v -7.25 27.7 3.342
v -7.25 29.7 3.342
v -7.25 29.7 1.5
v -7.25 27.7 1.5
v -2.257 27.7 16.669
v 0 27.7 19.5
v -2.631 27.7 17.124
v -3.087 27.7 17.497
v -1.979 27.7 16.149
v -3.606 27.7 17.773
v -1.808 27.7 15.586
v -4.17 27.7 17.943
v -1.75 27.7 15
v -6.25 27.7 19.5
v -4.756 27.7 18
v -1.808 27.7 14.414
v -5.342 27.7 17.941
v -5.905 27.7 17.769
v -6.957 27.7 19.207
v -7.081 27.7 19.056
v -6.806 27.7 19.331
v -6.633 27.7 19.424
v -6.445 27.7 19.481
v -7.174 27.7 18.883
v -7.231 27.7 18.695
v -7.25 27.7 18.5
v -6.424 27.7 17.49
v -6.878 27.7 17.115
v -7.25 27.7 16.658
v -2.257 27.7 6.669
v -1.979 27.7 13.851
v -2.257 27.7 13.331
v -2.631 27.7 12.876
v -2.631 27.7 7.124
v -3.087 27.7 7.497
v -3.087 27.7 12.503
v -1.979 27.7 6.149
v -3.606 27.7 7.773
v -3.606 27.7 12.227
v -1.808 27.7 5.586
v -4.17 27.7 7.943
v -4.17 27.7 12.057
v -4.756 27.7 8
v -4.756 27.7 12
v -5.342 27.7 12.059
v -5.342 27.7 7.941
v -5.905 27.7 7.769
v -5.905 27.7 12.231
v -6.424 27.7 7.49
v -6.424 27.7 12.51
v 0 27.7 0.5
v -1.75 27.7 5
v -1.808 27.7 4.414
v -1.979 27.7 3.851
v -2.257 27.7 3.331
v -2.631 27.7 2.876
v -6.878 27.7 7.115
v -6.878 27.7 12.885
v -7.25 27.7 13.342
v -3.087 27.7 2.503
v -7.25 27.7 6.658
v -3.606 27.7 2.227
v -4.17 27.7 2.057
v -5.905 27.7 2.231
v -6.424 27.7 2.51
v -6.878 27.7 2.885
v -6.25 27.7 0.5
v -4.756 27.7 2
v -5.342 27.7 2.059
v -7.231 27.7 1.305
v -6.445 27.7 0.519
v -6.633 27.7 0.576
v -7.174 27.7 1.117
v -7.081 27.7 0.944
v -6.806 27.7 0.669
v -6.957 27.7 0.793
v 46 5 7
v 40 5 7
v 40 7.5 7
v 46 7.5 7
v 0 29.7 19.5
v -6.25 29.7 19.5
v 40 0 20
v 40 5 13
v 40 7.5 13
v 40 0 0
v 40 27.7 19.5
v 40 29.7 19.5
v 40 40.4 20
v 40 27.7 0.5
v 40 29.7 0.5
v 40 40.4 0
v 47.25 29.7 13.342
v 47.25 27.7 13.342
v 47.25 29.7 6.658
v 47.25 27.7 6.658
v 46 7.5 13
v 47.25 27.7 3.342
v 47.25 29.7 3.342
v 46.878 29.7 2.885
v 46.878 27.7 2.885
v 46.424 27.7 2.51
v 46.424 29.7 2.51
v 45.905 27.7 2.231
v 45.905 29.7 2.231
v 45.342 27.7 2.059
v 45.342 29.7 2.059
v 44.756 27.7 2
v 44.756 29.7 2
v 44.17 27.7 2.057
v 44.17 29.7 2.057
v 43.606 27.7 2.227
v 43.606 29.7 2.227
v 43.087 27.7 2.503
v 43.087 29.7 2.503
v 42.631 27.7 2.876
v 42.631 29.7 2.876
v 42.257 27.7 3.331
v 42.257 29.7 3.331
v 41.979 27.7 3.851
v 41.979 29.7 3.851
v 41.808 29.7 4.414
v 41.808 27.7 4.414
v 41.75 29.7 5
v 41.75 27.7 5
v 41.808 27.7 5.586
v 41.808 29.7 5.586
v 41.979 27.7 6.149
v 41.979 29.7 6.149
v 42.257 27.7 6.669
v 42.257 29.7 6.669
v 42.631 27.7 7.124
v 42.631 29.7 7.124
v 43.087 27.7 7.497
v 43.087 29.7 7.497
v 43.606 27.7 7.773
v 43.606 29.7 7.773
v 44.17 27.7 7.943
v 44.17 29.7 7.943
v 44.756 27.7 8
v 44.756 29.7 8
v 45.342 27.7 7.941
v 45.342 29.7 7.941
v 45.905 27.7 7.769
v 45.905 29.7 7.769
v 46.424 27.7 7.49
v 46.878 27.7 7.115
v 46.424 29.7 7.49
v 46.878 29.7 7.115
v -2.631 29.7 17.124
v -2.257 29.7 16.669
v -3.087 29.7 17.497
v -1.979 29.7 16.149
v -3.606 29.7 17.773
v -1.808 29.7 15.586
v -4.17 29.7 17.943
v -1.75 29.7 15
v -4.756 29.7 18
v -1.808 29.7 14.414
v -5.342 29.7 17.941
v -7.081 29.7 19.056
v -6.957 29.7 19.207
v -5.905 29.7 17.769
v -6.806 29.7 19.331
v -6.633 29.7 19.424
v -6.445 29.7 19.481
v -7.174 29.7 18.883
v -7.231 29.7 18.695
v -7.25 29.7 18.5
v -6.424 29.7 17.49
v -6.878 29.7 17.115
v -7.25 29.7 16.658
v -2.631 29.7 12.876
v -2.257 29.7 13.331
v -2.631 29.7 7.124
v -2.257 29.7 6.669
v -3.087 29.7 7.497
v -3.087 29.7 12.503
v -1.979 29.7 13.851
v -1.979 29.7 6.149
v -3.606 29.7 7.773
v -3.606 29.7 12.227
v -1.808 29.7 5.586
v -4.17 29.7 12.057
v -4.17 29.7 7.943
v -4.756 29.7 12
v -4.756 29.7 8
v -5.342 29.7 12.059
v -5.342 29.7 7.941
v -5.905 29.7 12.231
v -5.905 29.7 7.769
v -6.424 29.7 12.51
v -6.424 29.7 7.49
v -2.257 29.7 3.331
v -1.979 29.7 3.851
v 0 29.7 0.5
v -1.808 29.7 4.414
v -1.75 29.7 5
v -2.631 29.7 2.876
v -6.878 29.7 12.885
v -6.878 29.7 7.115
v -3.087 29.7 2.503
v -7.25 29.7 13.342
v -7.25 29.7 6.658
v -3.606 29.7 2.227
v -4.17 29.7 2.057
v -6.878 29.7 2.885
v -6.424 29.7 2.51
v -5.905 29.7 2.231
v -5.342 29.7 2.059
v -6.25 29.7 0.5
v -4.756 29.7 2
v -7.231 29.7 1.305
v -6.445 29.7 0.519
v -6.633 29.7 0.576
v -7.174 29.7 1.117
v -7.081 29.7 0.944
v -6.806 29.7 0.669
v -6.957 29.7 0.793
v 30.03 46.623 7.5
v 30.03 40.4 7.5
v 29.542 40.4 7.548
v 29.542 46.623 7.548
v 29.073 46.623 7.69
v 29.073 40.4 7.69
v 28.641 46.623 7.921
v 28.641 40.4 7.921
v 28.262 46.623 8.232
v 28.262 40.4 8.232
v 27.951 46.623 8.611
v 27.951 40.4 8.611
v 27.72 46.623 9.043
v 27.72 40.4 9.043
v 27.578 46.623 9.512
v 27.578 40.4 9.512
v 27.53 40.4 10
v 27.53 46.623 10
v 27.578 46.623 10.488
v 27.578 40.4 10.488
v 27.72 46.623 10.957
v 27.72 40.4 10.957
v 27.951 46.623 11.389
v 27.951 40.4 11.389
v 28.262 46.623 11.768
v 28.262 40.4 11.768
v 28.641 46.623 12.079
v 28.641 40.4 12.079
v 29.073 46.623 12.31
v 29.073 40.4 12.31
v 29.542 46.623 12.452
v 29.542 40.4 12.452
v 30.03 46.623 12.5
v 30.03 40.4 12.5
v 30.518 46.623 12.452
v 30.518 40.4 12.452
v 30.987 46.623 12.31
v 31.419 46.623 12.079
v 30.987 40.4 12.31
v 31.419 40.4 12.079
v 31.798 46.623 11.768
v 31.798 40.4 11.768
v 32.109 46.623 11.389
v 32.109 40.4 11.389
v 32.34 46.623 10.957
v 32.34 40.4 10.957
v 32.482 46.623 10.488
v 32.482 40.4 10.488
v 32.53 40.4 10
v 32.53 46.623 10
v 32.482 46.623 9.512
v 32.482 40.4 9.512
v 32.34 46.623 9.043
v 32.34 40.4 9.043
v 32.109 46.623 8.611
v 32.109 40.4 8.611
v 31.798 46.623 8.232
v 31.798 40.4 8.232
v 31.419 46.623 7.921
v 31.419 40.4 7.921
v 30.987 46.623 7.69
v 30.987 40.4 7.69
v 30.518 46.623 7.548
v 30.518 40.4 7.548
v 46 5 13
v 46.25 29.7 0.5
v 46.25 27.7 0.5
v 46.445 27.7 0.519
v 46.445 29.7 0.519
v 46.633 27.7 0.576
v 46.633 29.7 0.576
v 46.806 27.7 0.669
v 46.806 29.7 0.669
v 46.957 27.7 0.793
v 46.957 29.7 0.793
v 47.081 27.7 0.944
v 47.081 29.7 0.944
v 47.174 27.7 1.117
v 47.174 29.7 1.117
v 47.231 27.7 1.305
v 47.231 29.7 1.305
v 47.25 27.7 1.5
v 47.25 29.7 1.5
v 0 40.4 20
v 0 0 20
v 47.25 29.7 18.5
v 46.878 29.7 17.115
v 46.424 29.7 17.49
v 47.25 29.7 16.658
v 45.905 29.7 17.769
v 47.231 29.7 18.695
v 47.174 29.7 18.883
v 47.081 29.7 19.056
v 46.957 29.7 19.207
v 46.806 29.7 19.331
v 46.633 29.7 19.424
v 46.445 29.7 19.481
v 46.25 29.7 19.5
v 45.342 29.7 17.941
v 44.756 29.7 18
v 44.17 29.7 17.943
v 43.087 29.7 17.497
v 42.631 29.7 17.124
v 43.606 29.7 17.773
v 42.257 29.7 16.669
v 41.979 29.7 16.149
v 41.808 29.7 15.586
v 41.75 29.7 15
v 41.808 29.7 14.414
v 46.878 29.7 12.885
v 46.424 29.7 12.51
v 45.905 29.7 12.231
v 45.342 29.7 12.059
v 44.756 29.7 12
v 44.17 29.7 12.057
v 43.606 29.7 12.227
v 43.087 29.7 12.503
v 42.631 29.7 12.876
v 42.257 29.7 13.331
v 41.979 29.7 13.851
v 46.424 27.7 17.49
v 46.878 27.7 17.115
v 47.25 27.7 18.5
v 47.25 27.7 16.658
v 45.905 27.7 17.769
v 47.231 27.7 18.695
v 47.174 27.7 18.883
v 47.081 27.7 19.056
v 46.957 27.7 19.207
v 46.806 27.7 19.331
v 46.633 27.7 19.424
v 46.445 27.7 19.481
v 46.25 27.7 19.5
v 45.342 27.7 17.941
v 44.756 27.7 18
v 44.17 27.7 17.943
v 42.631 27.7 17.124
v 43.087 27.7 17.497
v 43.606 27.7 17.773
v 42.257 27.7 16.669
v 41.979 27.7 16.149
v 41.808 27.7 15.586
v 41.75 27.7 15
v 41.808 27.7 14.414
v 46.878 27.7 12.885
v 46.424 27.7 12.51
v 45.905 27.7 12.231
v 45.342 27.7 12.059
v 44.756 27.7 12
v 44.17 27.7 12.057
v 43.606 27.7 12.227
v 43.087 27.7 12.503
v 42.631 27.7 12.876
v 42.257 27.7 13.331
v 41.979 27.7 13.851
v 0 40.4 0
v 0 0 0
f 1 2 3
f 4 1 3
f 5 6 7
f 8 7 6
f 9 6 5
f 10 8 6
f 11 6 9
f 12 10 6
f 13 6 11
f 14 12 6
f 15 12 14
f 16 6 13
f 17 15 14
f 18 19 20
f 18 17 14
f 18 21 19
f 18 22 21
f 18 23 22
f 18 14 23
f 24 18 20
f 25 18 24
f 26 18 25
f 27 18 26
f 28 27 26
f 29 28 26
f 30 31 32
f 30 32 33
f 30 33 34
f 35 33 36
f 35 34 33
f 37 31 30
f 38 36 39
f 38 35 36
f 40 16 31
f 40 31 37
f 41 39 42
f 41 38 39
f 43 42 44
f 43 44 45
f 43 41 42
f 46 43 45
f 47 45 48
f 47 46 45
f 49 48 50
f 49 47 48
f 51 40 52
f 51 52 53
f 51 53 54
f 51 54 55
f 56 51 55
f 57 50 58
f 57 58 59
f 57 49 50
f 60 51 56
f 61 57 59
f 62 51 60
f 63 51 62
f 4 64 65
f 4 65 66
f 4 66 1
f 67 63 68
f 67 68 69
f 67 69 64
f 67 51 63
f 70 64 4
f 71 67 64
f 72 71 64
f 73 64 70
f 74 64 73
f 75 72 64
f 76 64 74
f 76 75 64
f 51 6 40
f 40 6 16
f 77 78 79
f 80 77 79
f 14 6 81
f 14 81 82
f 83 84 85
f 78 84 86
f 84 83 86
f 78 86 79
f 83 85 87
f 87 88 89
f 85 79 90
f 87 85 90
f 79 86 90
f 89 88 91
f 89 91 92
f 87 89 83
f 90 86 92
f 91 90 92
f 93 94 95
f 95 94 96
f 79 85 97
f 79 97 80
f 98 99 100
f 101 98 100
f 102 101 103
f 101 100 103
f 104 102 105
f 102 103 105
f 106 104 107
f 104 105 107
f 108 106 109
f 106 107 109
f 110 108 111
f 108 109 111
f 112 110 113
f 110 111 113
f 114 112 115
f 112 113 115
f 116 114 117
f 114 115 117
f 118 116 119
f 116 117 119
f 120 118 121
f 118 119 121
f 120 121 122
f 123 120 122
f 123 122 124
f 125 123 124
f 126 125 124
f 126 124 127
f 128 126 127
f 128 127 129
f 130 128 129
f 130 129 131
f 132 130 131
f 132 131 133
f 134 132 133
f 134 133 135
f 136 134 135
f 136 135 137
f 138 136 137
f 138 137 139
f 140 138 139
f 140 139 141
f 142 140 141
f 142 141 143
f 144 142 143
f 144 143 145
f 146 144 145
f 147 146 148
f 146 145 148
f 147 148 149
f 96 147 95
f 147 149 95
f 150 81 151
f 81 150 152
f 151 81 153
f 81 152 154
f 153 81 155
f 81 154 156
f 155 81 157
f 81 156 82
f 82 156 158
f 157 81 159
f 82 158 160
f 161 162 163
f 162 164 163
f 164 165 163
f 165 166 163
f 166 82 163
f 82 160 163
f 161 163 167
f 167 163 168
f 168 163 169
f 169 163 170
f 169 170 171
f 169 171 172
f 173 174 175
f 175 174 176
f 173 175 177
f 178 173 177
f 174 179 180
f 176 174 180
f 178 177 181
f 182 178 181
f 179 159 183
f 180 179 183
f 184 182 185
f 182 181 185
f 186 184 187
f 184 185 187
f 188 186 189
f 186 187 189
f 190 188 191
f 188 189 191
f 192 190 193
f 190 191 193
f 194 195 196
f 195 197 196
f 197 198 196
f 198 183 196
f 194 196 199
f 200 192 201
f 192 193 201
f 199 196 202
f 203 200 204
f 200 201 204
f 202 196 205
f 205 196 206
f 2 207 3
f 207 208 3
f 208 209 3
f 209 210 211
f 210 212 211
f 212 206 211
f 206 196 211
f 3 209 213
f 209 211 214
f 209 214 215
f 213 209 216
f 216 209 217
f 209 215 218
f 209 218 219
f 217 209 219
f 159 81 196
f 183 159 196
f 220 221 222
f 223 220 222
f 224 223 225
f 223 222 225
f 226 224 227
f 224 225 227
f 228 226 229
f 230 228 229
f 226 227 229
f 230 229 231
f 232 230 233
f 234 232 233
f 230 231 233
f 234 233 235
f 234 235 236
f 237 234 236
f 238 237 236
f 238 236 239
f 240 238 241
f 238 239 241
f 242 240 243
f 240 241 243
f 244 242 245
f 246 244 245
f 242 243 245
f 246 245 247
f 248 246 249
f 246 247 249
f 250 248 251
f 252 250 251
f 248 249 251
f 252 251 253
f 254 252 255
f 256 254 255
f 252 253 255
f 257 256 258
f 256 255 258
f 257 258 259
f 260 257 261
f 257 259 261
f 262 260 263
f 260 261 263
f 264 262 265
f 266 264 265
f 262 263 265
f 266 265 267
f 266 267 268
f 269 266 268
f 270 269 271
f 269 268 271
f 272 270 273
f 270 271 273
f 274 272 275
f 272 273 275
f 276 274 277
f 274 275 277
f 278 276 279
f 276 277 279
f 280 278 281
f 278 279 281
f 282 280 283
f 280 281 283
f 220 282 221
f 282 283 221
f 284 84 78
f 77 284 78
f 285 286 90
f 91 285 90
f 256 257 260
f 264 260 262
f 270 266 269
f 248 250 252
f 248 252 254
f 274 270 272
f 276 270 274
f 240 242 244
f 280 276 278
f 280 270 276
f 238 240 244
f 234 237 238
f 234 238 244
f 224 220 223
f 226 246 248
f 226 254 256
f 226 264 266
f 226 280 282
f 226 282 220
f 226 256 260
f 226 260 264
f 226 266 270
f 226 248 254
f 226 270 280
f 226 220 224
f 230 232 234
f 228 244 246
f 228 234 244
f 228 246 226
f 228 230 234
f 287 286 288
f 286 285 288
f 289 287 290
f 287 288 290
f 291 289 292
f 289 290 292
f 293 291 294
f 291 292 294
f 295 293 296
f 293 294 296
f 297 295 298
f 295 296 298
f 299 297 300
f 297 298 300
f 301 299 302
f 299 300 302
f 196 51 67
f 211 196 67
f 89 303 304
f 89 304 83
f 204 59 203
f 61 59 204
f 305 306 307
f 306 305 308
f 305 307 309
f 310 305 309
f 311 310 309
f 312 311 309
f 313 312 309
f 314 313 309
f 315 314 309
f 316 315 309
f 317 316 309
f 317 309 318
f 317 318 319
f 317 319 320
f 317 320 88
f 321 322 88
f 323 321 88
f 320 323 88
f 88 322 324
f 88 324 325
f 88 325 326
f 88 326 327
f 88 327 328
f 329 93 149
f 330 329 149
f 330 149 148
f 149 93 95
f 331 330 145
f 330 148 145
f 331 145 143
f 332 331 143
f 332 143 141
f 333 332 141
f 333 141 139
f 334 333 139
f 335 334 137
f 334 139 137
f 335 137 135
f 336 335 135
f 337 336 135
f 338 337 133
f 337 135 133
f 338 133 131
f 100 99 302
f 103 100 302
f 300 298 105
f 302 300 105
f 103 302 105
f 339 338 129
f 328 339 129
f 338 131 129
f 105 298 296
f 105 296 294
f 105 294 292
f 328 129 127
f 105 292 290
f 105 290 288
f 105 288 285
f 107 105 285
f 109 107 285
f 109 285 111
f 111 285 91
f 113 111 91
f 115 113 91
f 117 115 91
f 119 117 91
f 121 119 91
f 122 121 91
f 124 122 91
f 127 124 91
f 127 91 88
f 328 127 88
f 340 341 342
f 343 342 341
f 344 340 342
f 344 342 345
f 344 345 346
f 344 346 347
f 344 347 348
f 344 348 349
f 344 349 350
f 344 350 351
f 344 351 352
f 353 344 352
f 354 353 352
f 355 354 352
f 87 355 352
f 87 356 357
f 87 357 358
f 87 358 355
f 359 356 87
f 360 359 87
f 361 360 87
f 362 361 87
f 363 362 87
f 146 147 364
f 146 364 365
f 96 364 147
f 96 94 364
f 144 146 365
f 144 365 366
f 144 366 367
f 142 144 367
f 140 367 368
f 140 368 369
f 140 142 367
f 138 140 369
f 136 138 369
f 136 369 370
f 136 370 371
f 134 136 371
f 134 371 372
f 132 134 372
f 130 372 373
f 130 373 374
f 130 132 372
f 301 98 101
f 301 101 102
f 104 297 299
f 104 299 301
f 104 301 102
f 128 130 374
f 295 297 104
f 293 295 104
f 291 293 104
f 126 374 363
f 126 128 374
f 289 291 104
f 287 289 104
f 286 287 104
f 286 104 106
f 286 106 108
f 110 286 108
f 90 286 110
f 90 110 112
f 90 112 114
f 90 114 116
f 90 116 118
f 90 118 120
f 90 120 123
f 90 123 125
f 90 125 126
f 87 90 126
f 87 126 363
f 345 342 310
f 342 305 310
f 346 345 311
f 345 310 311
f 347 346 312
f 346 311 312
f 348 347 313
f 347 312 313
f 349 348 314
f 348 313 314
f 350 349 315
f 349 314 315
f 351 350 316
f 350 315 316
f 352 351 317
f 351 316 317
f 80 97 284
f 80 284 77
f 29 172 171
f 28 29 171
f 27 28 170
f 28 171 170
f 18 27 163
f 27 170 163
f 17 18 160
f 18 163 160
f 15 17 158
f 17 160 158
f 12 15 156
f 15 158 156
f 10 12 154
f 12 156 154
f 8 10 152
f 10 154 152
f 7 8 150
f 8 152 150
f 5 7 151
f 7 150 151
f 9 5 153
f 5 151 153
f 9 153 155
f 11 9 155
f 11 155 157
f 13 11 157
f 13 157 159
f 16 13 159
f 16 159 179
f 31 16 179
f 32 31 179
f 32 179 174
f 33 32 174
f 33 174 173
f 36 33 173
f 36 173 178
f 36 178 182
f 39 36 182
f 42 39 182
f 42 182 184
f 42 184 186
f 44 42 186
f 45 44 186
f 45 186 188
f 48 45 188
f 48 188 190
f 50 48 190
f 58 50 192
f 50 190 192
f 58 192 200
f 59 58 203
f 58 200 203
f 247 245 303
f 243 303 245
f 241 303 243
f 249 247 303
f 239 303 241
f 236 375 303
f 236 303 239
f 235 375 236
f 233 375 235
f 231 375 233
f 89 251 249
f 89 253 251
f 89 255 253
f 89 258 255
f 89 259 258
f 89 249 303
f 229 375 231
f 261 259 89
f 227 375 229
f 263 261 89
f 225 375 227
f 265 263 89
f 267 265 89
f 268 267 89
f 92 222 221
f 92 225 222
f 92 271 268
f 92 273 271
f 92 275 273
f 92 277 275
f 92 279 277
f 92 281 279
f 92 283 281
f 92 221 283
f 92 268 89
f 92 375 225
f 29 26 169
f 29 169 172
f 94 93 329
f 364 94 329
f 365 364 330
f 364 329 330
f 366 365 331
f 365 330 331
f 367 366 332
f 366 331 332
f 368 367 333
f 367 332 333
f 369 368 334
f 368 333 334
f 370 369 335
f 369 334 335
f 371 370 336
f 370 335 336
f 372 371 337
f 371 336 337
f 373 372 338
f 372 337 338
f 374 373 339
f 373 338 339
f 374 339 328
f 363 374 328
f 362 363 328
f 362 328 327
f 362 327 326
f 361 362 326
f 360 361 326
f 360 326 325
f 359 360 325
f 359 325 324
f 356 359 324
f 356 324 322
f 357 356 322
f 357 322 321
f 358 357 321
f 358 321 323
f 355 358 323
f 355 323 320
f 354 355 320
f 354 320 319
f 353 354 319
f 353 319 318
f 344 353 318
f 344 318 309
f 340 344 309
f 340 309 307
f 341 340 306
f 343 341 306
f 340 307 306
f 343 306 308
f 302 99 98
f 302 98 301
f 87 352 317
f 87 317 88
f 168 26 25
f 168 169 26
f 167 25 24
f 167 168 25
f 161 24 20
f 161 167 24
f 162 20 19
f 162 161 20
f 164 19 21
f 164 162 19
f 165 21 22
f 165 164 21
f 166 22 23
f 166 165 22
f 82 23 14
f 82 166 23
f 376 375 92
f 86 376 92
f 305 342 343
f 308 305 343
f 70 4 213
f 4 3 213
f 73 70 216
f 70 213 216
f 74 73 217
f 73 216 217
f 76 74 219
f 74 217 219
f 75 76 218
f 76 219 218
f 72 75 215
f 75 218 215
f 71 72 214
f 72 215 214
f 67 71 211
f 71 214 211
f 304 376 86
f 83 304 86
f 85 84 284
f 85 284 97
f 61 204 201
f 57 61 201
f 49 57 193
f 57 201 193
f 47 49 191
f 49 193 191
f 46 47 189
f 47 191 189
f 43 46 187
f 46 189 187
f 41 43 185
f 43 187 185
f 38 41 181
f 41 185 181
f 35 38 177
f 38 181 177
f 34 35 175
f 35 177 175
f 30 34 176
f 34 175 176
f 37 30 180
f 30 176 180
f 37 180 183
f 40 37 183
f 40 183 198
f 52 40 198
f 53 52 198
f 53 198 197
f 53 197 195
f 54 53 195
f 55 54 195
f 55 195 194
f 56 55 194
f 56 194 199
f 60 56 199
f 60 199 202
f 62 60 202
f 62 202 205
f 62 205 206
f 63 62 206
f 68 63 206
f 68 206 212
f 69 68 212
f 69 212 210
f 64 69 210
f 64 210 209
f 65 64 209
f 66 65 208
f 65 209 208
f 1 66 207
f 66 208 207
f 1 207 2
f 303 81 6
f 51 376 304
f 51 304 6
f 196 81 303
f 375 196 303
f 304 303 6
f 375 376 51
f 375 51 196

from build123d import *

# Parameters (mm, degrees)
SKETCH1_W           = 40
SKETCH1_H           = 40.4
BOSS_EXTRUDE1_DEPTH = 20
SKETCH2_W           = 54.5
SKETCH2_H           = 19
BOSS_EXTRUDE2_DEPTH = 2
SKETCH3_R           = 3
CUT_EXTRUDE1_DEPTH  = 60.284504721
FILLET1_R           = 1
SKETCH4_R           = 2.5
BOSS_EXTRUDE3_DEPTH = 6.223
SKETCH5_W           = 6
SKETCH5_H           = 2.5
BOSS_EXTRUDE4_DEPTH = 6


with BuildPart() as part:
    # Sketch1 → Boss-Extrude1 (new body)
    with BuildSketch(Plane.XY):
        with Locations((20, 20.2)):
            Rectangle(SKETCH1_W, SKETCH1_H)
    extrude(amount=BOSS_EXTRUDE1_DEPTH)

    # Sketch2 → Boss-Extrude2 (add)
    with BuildSketch(Plane(origin=(0, 27.7, 0), x_dir=(-1, 0, 0), z_dir=(0, -1, 0))):
        with Locations((-20, -10)):
            Rectangle(SKETCH2_W, SKETCH2_H)
    extrude(amount=-BOSS_EXTRUDE2_DEPTH)

    # Sketch3 → Cut-Extrude1 (cut, through all)
    with BuildSketch(Plane(origin=(0, 29.7, 0), x_dir=(1, 0, 0), z_dir=(0, 1, 0))):
        with Locations((-4.75, -15)):
            Circle(SKETCH3_R)
        with Locations((-4.75, -5)):
            Circle(SKETCH3_R)
        with Locations((44.75, -5)):
            Circle(SKETCH3_R)
        with Locations((44.75, -15)):
            Circle(SKETCH3_R)
    extrude(amount=-CUT_EXTRUDE1_DEPTH, mode=Mode.SUBTRACT)

    # Fillet1
    fillet1_edges = [part.edges().sort_by_distance(p)[0] for p in [
        (-7.25, 28.7, 19.5),
        (47.25, 28.7, 0.5),
        (-7.25, 28.7, 0.5),
        (47.25, 28.7, 19.5),
    ]]
    fillet(fillet1_edges, radius=FILLET1_R)

    # Sketch4 → Boss-Extrude3 (add)
    with BuildSketch(Plane(origin=(0, 40.4, 0), x_dir=(1, 0, 0), z_dir=(0, 1, 0))):
        with Locations(Location((30.03, -10, 0), (0, 0, 90))):
            Circle(SKETCH4_R)
    extrude(amount=BOSS_EXTRUDE3_DEPTH)

    # Sketch5 → Boss-Extrude4 (add)
    with BuildSketch(Plane(origin=(40, 0, 0), x_dir=(0, 0, -1), z_dir=(1, 0, 0))):
        with Locations((-10, 6.25)):
            Rectangle(SKETCH5_W, SKETCH5_H)
    extrude(amount=BOSS_EXTRUDE4_DEPTH)


solid = part.part
